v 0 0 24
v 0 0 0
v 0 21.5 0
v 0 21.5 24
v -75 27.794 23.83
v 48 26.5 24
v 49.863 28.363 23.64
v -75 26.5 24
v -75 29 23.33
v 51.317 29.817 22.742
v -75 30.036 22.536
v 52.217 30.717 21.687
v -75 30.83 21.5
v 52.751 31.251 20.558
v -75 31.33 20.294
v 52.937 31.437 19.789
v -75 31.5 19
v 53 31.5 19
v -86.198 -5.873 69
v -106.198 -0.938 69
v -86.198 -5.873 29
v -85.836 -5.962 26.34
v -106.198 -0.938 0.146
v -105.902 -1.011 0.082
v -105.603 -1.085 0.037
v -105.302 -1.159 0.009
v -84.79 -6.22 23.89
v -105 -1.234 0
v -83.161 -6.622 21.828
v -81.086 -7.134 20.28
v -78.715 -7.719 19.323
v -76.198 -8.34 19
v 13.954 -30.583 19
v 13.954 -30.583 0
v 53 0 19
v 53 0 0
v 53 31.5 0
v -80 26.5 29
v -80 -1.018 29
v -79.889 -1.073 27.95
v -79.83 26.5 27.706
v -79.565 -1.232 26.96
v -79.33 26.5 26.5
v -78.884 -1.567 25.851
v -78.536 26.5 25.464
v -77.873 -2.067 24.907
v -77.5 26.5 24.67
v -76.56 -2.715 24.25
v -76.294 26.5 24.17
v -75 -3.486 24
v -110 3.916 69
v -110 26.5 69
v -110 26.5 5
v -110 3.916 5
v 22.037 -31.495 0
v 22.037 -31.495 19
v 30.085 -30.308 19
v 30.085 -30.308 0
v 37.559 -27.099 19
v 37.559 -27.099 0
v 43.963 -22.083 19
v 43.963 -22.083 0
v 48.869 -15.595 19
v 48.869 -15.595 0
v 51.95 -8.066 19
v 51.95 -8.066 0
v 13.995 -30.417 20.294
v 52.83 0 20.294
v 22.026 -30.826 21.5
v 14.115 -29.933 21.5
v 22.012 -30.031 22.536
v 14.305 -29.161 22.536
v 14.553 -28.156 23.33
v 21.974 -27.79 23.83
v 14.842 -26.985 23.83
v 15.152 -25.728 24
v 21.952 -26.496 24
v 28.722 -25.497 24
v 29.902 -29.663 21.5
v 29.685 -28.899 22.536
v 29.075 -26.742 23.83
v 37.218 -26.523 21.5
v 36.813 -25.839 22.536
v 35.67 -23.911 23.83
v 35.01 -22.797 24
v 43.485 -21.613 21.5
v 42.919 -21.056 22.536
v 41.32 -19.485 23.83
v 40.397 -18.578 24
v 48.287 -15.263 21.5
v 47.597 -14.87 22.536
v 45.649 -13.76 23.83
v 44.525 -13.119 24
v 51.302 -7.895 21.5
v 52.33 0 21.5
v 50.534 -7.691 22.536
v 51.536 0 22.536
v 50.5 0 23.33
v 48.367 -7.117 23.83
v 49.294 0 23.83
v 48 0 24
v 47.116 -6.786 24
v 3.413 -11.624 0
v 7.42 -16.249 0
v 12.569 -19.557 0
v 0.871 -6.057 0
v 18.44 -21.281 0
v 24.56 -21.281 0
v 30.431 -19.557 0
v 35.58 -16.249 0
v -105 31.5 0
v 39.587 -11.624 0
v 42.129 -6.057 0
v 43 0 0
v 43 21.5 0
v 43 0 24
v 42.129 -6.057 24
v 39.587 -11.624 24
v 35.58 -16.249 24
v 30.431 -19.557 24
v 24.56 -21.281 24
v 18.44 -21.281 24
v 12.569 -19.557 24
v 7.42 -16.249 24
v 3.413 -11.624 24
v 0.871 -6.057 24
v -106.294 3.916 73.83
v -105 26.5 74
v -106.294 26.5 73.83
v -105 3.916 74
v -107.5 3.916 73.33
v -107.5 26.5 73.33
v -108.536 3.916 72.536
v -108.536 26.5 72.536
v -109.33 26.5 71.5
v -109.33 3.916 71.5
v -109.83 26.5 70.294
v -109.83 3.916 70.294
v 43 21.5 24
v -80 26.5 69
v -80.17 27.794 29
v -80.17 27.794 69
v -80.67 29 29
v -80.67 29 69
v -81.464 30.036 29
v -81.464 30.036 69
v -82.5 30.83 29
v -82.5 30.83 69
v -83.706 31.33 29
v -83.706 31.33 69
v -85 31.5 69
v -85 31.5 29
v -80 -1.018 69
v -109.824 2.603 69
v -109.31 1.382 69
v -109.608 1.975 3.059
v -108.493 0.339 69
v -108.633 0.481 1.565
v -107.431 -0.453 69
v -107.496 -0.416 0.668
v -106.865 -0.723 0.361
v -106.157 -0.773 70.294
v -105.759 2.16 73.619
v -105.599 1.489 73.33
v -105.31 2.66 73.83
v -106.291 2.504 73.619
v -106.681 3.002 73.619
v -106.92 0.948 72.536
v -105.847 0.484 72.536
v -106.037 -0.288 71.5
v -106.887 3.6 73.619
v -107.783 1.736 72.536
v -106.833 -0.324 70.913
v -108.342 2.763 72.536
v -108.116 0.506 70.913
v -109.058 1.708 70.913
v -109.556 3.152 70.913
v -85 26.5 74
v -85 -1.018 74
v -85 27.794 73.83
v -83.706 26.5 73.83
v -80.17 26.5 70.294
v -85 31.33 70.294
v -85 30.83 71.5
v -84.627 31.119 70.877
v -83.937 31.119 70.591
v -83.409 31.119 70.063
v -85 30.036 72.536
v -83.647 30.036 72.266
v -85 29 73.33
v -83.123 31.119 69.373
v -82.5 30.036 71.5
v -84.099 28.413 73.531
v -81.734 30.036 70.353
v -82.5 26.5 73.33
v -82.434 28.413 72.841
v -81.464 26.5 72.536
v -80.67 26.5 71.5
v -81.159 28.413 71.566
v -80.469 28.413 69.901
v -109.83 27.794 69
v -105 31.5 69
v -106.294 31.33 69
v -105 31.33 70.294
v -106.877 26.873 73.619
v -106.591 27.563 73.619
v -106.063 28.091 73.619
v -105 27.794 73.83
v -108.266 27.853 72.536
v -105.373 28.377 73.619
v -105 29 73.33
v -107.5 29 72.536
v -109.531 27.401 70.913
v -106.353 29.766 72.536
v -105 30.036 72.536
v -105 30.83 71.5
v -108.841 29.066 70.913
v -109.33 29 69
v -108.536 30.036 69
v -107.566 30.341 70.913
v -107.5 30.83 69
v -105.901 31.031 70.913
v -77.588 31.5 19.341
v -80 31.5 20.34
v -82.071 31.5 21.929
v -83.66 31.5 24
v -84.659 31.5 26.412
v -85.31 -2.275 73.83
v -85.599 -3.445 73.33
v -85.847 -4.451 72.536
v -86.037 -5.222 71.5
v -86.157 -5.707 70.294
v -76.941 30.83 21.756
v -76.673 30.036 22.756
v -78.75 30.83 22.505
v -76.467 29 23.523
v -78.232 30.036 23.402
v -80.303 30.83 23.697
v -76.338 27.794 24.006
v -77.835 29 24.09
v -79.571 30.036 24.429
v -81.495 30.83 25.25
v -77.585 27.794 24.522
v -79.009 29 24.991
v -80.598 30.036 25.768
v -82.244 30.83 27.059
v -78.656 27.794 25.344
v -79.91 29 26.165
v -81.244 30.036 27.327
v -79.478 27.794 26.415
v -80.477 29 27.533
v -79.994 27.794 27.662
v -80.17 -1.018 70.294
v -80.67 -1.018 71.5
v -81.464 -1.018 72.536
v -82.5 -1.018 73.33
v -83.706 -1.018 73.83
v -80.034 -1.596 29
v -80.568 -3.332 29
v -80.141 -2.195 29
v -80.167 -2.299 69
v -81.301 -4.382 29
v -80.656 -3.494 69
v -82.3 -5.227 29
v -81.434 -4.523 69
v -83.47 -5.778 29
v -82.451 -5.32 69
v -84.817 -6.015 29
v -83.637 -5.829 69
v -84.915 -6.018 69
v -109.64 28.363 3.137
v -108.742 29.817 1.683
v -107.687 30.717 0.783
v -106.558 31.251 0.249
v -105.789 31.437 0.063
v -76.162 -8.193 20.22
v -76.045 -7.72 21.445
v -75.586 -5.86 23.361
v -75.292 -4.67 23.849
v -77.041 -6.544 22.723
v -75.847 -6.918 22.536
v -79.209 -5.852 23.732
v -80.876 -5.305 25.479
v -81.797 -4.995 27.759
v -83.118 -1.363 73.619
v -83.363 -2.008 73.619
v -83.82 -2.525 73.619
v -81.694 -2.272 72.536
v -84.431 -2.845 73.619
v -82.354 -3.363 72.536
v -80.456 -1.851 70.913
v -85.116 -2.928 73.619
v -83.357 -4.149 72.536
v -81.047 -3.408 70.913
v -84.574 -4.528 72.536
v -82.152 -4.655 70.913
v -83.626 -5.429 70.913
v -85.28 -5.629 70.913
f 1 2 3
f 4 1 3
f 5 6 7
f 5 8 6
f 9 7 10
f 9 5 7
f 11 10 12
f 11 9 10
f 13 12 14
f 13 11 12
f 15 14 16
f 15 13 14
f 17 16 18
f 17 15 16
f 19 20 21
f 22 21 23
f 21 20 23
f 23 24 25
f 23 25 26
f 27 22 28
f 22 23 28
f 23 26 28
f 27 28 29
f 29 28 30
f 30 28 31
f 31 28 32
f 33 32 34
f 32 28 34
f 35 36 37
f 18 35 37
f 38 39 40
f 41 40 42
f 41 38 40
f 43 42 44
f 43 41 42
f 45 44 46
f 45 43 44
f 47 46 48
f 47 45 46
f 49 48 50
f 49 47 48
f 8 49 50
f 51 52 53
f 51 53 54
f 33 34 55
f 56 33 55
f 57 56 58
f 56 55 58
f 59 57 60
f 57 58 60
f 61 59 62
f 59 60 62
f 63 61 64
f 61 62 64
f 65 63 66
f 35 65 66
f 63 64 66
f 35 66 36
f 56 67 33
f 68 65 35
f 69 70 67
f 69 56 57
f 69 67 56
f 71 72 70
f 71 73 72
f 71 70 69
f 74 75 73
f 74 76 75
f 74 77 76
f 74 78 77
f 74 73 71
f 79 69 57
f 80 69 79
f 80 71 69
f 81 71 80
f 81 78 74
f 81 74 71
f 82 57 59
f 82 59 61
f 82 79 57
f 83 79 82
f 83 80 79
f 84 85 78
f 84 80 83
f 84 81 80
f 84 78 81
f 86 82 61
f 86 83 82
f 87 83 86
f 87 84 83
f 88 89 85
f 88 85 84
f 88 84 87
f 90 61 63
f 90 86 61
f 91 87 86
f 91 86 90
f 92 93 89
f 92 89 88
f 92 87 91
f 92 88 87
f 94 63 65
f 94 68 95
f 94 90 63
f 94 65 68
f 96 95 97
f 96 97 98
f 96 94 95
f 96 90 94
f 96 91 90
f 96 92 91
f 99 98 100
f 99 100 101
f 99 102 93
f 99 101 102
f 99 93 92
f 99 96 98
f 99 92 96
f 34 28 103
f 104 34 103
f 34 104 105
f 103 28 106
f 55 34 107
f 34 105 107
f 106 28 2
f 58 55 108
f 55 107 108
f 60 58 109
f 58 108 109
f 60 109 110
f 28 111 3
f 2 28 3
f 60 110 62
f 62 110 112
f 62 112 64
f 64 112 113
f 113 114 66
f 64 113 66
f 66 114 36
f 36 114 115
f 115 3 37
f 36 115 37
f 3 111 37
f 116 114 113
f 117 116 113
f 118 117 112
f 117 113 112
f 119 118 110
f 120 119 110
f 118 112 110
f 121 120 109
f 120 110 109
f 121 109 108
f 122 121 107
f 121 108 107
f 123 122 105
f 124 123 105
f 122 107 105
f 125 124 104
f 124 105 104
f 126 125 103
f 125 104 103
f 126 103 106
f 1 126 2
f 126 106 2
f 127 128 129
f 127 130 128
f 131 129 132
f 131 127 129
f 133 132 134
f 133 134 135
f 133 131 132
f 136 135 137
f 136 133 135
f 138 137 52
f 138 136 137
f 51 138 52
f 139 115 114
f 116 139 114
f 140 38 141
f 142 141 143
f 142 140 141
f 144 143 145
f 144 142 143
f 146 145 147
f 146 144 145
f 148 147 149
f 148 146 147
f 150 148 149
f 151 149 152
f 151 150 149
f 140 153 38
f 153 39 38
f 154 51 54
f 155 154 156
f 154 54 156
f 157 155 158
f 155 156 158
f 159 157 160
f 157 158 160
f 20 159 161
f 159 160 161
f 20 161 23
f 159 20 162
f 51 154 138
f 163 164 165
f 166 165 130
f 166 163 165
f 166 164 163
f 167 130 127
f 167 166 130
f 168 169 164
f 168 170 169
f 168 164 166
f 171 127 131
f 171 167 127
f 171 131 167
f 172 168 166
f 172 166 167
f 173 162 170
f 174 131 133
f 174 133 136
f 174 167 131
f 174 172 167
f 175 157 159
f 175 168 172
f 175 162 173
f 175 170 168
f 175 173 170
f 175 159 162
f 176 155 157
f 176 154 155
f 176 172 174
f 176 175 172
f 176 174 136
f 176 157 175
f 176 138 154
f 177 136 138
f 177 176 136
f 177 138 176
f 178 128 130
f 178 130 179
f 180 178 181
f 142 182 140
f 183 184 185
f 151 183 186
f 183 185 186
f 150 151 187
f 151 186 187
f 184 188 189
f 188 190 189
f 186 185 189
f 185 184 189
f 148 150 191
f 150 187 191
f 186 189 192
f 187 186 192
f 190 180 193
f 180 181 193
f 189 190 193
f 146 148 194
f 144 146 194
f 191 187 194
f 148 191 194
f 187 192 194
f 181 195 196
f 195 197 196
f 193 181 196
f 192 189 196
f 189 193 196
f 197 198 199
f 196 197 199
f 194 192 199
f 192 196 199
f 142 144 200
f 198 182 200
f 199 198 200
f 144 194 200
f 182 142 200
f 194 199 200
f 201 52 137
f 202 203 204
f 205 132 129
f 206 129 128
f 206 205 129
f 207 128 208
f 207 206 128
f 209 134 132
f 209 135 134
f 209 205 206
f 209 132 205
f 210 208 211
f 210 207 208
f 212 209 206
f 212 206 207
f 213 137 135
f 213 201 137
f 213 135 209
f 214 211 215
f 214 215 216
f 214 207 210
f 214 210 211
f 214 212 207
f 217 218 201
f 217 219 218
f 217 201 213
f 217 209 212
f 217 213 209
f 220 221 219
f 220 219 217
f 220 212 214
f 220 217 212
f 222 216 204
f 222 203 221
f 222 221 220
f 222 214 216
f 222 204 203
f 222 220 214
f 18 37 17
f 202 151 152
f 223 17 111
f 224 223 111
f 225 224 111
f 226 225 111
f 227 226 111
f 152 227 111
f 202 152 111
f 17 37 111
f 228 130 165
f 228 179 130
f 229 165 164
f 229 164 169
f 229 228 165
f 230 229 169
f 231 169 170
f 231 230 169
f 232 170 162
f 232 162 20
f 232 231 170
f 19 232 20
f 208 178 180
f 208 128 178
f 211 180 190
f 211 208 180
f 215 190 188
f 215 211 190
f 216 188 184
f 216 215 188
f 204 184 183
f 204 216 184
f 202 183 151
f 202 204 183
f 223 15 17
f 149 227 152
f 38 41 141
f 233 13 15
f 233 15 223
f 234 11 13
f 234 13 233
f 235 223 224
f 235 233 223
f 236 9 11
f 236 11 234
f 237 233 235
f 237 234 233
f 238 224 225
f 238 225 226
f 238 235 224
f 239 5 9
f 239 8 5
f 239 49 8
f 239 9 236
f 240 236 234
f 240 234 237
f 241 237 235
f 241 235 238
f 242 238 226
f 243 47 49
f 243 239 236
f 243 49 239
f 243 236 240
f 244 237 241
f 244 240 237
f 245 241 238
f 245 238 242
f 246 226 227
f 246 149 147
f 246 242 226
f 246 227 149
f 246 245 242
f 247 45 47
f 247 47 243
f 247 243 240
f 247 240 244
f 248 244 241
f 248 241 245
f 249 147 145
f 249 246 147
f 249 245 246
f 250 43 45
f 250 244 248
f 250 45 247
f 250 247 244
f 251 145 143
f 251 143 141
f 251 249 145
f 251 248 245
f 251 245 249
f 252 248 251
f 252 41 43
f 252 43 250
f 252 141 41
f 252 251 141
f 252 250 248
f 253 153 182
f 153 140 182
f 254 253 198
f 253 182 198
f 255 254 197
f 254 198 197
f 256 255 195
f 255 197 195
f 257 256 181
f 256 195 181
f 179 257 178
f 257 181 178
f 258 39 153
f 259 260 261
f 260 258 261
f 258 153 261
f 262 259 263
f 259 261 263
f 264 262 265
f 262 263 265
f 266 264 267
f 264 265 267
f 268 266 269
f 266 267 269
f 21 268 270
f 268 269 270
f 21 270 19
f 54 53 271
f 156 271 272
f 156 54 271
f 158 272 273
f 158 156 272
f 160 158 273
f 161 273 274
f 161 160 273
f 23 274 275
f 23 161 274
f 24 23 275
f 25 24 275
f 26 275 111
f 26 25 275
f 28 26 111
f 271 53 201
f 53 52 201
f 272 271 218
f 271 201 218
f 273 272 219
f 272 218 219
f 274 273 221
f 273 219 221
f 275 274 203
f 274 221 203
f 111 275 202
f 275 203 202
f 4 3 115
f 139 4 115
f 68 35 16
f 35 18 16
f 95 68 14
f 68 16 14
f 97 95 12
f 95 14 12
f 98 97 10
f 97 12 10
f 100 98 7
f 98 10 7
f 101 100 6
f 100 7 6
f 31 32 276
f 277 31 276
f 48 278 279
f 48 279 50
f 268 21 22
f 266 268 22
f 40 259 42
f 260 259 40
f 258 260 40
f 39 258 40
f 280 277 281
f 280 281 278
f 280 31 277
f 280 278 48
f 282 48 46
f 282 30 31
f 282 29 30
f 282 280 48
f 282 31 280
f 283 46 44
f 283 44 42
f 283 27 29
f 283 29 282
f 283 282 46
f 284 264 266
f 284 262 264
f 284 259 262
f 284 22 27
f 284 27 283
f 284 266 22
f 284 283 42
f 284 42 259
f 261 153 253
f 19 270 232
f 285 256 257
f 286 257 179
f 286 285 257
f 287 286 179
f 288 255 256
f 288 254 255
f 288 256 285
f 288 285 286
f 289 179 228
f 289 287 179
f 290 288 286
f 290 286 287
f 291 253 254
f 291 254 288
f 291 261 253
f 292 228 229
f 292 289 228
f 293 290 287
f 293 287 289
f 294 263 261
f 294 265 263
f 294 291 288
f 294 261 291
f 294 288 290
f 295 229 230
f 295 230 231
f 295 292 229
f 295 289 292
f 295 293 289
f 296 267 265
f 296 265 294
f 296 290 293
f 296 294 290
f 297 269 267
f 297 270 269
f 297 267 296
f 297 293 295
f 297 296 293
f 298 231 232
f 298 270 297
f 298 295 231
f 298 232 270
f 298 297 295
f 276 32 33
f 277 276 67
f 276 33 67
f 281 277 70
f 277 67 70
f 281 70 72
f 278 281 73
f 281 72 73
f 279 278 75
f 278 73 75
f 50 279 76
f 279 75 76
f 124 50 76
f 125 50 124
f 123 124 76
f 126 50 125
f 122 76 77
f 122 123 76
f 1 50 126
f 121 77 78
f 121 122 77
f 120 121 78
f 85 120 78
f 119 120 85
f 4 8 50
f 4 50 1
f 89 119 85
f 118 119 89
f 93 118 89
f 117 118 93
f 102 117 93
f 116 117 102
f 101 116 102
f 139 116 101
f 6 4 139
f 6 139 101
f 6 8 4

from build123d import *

# Parameters (mm, degrees)
F1_DEPTH = 24
F3_DEPTH = 50
F4_R     = 5


with BuildPart() as f1:
    # F0 (on Top) → F1 (new body)
    with BuildSketch(Plane.XY):
        with BuildLine():
            Line((-10, 0), (-10, 31.5))
            Line((-10, 31.5), (-110, 31.5))
            Line((-110, 31.5), (-110, 0))
            Line((-110, 0), (13.9543726236, -30.5828956689))
            ThreePointArc((13.9543726236, -30.5828956689), (-3.2985610707, -19.4237321033), (-10, 0))
        make_face()
        with BuildLine():
            Line((53, 31.5), (-10, 31.5))
            Line((-10, 31.5), (-10, 0))
            ThreePointArc((-10, 0), (-3.2985610707, -19.4237321033), (13.9543726236, -30.5828956689))
            ThreePointArc((13.9543726236, -30.5828956689), (40.9237321033, -24.7985610707), (53, 0))
            Line((53, 0), (53, 31.5))
        make_face()
        with BuildLine():
            ThreePointArc((43, 0), (21.5, -21.5), (0, 0))
            Line((0, 0), (0, 21.5))
            Line((0, 21.5), (43, 21.5))
            Line((43, 21.5), (43, 0))
        make_face(mode=Mode.SUBTRACT)
    extrude(amount=F1_DEPTH)

    # F2 (on face) → F3 (join)
    with BuildSketch(Plane.XY.offset(24)):
        Polygon((-80, -7.4018112524), (-80, 31.5), (-110, 31.5), (-110, 0), align=None)
    extrude(amount=F3_DEPTH)

    # F4
    f4_edges = [f1.edges().sort_by_distance(p)[0] for p in [
        (-110, 31.5, 37),
        (-110, 15.75, 74),
        (-110, 0, 37),
        (-110, 15.75, 0),
        (-80, 12.049094, 74),
        (-95, 31.5, 74),
        (-95, -3.700906, 74),
        (-80, -7.401811, 49),
        (-80, 31.5, 49),
        (-80, 12.049094, 24),
        (-13.5, 31.5, 24),
        (53, 15.75, 24),
        (40.923732, -24.798561, 24),
        (-33.022814, -18.992353, 24),
    ]]
    fillet(f4_edges, radius=F4_R)


solid = f1.part
